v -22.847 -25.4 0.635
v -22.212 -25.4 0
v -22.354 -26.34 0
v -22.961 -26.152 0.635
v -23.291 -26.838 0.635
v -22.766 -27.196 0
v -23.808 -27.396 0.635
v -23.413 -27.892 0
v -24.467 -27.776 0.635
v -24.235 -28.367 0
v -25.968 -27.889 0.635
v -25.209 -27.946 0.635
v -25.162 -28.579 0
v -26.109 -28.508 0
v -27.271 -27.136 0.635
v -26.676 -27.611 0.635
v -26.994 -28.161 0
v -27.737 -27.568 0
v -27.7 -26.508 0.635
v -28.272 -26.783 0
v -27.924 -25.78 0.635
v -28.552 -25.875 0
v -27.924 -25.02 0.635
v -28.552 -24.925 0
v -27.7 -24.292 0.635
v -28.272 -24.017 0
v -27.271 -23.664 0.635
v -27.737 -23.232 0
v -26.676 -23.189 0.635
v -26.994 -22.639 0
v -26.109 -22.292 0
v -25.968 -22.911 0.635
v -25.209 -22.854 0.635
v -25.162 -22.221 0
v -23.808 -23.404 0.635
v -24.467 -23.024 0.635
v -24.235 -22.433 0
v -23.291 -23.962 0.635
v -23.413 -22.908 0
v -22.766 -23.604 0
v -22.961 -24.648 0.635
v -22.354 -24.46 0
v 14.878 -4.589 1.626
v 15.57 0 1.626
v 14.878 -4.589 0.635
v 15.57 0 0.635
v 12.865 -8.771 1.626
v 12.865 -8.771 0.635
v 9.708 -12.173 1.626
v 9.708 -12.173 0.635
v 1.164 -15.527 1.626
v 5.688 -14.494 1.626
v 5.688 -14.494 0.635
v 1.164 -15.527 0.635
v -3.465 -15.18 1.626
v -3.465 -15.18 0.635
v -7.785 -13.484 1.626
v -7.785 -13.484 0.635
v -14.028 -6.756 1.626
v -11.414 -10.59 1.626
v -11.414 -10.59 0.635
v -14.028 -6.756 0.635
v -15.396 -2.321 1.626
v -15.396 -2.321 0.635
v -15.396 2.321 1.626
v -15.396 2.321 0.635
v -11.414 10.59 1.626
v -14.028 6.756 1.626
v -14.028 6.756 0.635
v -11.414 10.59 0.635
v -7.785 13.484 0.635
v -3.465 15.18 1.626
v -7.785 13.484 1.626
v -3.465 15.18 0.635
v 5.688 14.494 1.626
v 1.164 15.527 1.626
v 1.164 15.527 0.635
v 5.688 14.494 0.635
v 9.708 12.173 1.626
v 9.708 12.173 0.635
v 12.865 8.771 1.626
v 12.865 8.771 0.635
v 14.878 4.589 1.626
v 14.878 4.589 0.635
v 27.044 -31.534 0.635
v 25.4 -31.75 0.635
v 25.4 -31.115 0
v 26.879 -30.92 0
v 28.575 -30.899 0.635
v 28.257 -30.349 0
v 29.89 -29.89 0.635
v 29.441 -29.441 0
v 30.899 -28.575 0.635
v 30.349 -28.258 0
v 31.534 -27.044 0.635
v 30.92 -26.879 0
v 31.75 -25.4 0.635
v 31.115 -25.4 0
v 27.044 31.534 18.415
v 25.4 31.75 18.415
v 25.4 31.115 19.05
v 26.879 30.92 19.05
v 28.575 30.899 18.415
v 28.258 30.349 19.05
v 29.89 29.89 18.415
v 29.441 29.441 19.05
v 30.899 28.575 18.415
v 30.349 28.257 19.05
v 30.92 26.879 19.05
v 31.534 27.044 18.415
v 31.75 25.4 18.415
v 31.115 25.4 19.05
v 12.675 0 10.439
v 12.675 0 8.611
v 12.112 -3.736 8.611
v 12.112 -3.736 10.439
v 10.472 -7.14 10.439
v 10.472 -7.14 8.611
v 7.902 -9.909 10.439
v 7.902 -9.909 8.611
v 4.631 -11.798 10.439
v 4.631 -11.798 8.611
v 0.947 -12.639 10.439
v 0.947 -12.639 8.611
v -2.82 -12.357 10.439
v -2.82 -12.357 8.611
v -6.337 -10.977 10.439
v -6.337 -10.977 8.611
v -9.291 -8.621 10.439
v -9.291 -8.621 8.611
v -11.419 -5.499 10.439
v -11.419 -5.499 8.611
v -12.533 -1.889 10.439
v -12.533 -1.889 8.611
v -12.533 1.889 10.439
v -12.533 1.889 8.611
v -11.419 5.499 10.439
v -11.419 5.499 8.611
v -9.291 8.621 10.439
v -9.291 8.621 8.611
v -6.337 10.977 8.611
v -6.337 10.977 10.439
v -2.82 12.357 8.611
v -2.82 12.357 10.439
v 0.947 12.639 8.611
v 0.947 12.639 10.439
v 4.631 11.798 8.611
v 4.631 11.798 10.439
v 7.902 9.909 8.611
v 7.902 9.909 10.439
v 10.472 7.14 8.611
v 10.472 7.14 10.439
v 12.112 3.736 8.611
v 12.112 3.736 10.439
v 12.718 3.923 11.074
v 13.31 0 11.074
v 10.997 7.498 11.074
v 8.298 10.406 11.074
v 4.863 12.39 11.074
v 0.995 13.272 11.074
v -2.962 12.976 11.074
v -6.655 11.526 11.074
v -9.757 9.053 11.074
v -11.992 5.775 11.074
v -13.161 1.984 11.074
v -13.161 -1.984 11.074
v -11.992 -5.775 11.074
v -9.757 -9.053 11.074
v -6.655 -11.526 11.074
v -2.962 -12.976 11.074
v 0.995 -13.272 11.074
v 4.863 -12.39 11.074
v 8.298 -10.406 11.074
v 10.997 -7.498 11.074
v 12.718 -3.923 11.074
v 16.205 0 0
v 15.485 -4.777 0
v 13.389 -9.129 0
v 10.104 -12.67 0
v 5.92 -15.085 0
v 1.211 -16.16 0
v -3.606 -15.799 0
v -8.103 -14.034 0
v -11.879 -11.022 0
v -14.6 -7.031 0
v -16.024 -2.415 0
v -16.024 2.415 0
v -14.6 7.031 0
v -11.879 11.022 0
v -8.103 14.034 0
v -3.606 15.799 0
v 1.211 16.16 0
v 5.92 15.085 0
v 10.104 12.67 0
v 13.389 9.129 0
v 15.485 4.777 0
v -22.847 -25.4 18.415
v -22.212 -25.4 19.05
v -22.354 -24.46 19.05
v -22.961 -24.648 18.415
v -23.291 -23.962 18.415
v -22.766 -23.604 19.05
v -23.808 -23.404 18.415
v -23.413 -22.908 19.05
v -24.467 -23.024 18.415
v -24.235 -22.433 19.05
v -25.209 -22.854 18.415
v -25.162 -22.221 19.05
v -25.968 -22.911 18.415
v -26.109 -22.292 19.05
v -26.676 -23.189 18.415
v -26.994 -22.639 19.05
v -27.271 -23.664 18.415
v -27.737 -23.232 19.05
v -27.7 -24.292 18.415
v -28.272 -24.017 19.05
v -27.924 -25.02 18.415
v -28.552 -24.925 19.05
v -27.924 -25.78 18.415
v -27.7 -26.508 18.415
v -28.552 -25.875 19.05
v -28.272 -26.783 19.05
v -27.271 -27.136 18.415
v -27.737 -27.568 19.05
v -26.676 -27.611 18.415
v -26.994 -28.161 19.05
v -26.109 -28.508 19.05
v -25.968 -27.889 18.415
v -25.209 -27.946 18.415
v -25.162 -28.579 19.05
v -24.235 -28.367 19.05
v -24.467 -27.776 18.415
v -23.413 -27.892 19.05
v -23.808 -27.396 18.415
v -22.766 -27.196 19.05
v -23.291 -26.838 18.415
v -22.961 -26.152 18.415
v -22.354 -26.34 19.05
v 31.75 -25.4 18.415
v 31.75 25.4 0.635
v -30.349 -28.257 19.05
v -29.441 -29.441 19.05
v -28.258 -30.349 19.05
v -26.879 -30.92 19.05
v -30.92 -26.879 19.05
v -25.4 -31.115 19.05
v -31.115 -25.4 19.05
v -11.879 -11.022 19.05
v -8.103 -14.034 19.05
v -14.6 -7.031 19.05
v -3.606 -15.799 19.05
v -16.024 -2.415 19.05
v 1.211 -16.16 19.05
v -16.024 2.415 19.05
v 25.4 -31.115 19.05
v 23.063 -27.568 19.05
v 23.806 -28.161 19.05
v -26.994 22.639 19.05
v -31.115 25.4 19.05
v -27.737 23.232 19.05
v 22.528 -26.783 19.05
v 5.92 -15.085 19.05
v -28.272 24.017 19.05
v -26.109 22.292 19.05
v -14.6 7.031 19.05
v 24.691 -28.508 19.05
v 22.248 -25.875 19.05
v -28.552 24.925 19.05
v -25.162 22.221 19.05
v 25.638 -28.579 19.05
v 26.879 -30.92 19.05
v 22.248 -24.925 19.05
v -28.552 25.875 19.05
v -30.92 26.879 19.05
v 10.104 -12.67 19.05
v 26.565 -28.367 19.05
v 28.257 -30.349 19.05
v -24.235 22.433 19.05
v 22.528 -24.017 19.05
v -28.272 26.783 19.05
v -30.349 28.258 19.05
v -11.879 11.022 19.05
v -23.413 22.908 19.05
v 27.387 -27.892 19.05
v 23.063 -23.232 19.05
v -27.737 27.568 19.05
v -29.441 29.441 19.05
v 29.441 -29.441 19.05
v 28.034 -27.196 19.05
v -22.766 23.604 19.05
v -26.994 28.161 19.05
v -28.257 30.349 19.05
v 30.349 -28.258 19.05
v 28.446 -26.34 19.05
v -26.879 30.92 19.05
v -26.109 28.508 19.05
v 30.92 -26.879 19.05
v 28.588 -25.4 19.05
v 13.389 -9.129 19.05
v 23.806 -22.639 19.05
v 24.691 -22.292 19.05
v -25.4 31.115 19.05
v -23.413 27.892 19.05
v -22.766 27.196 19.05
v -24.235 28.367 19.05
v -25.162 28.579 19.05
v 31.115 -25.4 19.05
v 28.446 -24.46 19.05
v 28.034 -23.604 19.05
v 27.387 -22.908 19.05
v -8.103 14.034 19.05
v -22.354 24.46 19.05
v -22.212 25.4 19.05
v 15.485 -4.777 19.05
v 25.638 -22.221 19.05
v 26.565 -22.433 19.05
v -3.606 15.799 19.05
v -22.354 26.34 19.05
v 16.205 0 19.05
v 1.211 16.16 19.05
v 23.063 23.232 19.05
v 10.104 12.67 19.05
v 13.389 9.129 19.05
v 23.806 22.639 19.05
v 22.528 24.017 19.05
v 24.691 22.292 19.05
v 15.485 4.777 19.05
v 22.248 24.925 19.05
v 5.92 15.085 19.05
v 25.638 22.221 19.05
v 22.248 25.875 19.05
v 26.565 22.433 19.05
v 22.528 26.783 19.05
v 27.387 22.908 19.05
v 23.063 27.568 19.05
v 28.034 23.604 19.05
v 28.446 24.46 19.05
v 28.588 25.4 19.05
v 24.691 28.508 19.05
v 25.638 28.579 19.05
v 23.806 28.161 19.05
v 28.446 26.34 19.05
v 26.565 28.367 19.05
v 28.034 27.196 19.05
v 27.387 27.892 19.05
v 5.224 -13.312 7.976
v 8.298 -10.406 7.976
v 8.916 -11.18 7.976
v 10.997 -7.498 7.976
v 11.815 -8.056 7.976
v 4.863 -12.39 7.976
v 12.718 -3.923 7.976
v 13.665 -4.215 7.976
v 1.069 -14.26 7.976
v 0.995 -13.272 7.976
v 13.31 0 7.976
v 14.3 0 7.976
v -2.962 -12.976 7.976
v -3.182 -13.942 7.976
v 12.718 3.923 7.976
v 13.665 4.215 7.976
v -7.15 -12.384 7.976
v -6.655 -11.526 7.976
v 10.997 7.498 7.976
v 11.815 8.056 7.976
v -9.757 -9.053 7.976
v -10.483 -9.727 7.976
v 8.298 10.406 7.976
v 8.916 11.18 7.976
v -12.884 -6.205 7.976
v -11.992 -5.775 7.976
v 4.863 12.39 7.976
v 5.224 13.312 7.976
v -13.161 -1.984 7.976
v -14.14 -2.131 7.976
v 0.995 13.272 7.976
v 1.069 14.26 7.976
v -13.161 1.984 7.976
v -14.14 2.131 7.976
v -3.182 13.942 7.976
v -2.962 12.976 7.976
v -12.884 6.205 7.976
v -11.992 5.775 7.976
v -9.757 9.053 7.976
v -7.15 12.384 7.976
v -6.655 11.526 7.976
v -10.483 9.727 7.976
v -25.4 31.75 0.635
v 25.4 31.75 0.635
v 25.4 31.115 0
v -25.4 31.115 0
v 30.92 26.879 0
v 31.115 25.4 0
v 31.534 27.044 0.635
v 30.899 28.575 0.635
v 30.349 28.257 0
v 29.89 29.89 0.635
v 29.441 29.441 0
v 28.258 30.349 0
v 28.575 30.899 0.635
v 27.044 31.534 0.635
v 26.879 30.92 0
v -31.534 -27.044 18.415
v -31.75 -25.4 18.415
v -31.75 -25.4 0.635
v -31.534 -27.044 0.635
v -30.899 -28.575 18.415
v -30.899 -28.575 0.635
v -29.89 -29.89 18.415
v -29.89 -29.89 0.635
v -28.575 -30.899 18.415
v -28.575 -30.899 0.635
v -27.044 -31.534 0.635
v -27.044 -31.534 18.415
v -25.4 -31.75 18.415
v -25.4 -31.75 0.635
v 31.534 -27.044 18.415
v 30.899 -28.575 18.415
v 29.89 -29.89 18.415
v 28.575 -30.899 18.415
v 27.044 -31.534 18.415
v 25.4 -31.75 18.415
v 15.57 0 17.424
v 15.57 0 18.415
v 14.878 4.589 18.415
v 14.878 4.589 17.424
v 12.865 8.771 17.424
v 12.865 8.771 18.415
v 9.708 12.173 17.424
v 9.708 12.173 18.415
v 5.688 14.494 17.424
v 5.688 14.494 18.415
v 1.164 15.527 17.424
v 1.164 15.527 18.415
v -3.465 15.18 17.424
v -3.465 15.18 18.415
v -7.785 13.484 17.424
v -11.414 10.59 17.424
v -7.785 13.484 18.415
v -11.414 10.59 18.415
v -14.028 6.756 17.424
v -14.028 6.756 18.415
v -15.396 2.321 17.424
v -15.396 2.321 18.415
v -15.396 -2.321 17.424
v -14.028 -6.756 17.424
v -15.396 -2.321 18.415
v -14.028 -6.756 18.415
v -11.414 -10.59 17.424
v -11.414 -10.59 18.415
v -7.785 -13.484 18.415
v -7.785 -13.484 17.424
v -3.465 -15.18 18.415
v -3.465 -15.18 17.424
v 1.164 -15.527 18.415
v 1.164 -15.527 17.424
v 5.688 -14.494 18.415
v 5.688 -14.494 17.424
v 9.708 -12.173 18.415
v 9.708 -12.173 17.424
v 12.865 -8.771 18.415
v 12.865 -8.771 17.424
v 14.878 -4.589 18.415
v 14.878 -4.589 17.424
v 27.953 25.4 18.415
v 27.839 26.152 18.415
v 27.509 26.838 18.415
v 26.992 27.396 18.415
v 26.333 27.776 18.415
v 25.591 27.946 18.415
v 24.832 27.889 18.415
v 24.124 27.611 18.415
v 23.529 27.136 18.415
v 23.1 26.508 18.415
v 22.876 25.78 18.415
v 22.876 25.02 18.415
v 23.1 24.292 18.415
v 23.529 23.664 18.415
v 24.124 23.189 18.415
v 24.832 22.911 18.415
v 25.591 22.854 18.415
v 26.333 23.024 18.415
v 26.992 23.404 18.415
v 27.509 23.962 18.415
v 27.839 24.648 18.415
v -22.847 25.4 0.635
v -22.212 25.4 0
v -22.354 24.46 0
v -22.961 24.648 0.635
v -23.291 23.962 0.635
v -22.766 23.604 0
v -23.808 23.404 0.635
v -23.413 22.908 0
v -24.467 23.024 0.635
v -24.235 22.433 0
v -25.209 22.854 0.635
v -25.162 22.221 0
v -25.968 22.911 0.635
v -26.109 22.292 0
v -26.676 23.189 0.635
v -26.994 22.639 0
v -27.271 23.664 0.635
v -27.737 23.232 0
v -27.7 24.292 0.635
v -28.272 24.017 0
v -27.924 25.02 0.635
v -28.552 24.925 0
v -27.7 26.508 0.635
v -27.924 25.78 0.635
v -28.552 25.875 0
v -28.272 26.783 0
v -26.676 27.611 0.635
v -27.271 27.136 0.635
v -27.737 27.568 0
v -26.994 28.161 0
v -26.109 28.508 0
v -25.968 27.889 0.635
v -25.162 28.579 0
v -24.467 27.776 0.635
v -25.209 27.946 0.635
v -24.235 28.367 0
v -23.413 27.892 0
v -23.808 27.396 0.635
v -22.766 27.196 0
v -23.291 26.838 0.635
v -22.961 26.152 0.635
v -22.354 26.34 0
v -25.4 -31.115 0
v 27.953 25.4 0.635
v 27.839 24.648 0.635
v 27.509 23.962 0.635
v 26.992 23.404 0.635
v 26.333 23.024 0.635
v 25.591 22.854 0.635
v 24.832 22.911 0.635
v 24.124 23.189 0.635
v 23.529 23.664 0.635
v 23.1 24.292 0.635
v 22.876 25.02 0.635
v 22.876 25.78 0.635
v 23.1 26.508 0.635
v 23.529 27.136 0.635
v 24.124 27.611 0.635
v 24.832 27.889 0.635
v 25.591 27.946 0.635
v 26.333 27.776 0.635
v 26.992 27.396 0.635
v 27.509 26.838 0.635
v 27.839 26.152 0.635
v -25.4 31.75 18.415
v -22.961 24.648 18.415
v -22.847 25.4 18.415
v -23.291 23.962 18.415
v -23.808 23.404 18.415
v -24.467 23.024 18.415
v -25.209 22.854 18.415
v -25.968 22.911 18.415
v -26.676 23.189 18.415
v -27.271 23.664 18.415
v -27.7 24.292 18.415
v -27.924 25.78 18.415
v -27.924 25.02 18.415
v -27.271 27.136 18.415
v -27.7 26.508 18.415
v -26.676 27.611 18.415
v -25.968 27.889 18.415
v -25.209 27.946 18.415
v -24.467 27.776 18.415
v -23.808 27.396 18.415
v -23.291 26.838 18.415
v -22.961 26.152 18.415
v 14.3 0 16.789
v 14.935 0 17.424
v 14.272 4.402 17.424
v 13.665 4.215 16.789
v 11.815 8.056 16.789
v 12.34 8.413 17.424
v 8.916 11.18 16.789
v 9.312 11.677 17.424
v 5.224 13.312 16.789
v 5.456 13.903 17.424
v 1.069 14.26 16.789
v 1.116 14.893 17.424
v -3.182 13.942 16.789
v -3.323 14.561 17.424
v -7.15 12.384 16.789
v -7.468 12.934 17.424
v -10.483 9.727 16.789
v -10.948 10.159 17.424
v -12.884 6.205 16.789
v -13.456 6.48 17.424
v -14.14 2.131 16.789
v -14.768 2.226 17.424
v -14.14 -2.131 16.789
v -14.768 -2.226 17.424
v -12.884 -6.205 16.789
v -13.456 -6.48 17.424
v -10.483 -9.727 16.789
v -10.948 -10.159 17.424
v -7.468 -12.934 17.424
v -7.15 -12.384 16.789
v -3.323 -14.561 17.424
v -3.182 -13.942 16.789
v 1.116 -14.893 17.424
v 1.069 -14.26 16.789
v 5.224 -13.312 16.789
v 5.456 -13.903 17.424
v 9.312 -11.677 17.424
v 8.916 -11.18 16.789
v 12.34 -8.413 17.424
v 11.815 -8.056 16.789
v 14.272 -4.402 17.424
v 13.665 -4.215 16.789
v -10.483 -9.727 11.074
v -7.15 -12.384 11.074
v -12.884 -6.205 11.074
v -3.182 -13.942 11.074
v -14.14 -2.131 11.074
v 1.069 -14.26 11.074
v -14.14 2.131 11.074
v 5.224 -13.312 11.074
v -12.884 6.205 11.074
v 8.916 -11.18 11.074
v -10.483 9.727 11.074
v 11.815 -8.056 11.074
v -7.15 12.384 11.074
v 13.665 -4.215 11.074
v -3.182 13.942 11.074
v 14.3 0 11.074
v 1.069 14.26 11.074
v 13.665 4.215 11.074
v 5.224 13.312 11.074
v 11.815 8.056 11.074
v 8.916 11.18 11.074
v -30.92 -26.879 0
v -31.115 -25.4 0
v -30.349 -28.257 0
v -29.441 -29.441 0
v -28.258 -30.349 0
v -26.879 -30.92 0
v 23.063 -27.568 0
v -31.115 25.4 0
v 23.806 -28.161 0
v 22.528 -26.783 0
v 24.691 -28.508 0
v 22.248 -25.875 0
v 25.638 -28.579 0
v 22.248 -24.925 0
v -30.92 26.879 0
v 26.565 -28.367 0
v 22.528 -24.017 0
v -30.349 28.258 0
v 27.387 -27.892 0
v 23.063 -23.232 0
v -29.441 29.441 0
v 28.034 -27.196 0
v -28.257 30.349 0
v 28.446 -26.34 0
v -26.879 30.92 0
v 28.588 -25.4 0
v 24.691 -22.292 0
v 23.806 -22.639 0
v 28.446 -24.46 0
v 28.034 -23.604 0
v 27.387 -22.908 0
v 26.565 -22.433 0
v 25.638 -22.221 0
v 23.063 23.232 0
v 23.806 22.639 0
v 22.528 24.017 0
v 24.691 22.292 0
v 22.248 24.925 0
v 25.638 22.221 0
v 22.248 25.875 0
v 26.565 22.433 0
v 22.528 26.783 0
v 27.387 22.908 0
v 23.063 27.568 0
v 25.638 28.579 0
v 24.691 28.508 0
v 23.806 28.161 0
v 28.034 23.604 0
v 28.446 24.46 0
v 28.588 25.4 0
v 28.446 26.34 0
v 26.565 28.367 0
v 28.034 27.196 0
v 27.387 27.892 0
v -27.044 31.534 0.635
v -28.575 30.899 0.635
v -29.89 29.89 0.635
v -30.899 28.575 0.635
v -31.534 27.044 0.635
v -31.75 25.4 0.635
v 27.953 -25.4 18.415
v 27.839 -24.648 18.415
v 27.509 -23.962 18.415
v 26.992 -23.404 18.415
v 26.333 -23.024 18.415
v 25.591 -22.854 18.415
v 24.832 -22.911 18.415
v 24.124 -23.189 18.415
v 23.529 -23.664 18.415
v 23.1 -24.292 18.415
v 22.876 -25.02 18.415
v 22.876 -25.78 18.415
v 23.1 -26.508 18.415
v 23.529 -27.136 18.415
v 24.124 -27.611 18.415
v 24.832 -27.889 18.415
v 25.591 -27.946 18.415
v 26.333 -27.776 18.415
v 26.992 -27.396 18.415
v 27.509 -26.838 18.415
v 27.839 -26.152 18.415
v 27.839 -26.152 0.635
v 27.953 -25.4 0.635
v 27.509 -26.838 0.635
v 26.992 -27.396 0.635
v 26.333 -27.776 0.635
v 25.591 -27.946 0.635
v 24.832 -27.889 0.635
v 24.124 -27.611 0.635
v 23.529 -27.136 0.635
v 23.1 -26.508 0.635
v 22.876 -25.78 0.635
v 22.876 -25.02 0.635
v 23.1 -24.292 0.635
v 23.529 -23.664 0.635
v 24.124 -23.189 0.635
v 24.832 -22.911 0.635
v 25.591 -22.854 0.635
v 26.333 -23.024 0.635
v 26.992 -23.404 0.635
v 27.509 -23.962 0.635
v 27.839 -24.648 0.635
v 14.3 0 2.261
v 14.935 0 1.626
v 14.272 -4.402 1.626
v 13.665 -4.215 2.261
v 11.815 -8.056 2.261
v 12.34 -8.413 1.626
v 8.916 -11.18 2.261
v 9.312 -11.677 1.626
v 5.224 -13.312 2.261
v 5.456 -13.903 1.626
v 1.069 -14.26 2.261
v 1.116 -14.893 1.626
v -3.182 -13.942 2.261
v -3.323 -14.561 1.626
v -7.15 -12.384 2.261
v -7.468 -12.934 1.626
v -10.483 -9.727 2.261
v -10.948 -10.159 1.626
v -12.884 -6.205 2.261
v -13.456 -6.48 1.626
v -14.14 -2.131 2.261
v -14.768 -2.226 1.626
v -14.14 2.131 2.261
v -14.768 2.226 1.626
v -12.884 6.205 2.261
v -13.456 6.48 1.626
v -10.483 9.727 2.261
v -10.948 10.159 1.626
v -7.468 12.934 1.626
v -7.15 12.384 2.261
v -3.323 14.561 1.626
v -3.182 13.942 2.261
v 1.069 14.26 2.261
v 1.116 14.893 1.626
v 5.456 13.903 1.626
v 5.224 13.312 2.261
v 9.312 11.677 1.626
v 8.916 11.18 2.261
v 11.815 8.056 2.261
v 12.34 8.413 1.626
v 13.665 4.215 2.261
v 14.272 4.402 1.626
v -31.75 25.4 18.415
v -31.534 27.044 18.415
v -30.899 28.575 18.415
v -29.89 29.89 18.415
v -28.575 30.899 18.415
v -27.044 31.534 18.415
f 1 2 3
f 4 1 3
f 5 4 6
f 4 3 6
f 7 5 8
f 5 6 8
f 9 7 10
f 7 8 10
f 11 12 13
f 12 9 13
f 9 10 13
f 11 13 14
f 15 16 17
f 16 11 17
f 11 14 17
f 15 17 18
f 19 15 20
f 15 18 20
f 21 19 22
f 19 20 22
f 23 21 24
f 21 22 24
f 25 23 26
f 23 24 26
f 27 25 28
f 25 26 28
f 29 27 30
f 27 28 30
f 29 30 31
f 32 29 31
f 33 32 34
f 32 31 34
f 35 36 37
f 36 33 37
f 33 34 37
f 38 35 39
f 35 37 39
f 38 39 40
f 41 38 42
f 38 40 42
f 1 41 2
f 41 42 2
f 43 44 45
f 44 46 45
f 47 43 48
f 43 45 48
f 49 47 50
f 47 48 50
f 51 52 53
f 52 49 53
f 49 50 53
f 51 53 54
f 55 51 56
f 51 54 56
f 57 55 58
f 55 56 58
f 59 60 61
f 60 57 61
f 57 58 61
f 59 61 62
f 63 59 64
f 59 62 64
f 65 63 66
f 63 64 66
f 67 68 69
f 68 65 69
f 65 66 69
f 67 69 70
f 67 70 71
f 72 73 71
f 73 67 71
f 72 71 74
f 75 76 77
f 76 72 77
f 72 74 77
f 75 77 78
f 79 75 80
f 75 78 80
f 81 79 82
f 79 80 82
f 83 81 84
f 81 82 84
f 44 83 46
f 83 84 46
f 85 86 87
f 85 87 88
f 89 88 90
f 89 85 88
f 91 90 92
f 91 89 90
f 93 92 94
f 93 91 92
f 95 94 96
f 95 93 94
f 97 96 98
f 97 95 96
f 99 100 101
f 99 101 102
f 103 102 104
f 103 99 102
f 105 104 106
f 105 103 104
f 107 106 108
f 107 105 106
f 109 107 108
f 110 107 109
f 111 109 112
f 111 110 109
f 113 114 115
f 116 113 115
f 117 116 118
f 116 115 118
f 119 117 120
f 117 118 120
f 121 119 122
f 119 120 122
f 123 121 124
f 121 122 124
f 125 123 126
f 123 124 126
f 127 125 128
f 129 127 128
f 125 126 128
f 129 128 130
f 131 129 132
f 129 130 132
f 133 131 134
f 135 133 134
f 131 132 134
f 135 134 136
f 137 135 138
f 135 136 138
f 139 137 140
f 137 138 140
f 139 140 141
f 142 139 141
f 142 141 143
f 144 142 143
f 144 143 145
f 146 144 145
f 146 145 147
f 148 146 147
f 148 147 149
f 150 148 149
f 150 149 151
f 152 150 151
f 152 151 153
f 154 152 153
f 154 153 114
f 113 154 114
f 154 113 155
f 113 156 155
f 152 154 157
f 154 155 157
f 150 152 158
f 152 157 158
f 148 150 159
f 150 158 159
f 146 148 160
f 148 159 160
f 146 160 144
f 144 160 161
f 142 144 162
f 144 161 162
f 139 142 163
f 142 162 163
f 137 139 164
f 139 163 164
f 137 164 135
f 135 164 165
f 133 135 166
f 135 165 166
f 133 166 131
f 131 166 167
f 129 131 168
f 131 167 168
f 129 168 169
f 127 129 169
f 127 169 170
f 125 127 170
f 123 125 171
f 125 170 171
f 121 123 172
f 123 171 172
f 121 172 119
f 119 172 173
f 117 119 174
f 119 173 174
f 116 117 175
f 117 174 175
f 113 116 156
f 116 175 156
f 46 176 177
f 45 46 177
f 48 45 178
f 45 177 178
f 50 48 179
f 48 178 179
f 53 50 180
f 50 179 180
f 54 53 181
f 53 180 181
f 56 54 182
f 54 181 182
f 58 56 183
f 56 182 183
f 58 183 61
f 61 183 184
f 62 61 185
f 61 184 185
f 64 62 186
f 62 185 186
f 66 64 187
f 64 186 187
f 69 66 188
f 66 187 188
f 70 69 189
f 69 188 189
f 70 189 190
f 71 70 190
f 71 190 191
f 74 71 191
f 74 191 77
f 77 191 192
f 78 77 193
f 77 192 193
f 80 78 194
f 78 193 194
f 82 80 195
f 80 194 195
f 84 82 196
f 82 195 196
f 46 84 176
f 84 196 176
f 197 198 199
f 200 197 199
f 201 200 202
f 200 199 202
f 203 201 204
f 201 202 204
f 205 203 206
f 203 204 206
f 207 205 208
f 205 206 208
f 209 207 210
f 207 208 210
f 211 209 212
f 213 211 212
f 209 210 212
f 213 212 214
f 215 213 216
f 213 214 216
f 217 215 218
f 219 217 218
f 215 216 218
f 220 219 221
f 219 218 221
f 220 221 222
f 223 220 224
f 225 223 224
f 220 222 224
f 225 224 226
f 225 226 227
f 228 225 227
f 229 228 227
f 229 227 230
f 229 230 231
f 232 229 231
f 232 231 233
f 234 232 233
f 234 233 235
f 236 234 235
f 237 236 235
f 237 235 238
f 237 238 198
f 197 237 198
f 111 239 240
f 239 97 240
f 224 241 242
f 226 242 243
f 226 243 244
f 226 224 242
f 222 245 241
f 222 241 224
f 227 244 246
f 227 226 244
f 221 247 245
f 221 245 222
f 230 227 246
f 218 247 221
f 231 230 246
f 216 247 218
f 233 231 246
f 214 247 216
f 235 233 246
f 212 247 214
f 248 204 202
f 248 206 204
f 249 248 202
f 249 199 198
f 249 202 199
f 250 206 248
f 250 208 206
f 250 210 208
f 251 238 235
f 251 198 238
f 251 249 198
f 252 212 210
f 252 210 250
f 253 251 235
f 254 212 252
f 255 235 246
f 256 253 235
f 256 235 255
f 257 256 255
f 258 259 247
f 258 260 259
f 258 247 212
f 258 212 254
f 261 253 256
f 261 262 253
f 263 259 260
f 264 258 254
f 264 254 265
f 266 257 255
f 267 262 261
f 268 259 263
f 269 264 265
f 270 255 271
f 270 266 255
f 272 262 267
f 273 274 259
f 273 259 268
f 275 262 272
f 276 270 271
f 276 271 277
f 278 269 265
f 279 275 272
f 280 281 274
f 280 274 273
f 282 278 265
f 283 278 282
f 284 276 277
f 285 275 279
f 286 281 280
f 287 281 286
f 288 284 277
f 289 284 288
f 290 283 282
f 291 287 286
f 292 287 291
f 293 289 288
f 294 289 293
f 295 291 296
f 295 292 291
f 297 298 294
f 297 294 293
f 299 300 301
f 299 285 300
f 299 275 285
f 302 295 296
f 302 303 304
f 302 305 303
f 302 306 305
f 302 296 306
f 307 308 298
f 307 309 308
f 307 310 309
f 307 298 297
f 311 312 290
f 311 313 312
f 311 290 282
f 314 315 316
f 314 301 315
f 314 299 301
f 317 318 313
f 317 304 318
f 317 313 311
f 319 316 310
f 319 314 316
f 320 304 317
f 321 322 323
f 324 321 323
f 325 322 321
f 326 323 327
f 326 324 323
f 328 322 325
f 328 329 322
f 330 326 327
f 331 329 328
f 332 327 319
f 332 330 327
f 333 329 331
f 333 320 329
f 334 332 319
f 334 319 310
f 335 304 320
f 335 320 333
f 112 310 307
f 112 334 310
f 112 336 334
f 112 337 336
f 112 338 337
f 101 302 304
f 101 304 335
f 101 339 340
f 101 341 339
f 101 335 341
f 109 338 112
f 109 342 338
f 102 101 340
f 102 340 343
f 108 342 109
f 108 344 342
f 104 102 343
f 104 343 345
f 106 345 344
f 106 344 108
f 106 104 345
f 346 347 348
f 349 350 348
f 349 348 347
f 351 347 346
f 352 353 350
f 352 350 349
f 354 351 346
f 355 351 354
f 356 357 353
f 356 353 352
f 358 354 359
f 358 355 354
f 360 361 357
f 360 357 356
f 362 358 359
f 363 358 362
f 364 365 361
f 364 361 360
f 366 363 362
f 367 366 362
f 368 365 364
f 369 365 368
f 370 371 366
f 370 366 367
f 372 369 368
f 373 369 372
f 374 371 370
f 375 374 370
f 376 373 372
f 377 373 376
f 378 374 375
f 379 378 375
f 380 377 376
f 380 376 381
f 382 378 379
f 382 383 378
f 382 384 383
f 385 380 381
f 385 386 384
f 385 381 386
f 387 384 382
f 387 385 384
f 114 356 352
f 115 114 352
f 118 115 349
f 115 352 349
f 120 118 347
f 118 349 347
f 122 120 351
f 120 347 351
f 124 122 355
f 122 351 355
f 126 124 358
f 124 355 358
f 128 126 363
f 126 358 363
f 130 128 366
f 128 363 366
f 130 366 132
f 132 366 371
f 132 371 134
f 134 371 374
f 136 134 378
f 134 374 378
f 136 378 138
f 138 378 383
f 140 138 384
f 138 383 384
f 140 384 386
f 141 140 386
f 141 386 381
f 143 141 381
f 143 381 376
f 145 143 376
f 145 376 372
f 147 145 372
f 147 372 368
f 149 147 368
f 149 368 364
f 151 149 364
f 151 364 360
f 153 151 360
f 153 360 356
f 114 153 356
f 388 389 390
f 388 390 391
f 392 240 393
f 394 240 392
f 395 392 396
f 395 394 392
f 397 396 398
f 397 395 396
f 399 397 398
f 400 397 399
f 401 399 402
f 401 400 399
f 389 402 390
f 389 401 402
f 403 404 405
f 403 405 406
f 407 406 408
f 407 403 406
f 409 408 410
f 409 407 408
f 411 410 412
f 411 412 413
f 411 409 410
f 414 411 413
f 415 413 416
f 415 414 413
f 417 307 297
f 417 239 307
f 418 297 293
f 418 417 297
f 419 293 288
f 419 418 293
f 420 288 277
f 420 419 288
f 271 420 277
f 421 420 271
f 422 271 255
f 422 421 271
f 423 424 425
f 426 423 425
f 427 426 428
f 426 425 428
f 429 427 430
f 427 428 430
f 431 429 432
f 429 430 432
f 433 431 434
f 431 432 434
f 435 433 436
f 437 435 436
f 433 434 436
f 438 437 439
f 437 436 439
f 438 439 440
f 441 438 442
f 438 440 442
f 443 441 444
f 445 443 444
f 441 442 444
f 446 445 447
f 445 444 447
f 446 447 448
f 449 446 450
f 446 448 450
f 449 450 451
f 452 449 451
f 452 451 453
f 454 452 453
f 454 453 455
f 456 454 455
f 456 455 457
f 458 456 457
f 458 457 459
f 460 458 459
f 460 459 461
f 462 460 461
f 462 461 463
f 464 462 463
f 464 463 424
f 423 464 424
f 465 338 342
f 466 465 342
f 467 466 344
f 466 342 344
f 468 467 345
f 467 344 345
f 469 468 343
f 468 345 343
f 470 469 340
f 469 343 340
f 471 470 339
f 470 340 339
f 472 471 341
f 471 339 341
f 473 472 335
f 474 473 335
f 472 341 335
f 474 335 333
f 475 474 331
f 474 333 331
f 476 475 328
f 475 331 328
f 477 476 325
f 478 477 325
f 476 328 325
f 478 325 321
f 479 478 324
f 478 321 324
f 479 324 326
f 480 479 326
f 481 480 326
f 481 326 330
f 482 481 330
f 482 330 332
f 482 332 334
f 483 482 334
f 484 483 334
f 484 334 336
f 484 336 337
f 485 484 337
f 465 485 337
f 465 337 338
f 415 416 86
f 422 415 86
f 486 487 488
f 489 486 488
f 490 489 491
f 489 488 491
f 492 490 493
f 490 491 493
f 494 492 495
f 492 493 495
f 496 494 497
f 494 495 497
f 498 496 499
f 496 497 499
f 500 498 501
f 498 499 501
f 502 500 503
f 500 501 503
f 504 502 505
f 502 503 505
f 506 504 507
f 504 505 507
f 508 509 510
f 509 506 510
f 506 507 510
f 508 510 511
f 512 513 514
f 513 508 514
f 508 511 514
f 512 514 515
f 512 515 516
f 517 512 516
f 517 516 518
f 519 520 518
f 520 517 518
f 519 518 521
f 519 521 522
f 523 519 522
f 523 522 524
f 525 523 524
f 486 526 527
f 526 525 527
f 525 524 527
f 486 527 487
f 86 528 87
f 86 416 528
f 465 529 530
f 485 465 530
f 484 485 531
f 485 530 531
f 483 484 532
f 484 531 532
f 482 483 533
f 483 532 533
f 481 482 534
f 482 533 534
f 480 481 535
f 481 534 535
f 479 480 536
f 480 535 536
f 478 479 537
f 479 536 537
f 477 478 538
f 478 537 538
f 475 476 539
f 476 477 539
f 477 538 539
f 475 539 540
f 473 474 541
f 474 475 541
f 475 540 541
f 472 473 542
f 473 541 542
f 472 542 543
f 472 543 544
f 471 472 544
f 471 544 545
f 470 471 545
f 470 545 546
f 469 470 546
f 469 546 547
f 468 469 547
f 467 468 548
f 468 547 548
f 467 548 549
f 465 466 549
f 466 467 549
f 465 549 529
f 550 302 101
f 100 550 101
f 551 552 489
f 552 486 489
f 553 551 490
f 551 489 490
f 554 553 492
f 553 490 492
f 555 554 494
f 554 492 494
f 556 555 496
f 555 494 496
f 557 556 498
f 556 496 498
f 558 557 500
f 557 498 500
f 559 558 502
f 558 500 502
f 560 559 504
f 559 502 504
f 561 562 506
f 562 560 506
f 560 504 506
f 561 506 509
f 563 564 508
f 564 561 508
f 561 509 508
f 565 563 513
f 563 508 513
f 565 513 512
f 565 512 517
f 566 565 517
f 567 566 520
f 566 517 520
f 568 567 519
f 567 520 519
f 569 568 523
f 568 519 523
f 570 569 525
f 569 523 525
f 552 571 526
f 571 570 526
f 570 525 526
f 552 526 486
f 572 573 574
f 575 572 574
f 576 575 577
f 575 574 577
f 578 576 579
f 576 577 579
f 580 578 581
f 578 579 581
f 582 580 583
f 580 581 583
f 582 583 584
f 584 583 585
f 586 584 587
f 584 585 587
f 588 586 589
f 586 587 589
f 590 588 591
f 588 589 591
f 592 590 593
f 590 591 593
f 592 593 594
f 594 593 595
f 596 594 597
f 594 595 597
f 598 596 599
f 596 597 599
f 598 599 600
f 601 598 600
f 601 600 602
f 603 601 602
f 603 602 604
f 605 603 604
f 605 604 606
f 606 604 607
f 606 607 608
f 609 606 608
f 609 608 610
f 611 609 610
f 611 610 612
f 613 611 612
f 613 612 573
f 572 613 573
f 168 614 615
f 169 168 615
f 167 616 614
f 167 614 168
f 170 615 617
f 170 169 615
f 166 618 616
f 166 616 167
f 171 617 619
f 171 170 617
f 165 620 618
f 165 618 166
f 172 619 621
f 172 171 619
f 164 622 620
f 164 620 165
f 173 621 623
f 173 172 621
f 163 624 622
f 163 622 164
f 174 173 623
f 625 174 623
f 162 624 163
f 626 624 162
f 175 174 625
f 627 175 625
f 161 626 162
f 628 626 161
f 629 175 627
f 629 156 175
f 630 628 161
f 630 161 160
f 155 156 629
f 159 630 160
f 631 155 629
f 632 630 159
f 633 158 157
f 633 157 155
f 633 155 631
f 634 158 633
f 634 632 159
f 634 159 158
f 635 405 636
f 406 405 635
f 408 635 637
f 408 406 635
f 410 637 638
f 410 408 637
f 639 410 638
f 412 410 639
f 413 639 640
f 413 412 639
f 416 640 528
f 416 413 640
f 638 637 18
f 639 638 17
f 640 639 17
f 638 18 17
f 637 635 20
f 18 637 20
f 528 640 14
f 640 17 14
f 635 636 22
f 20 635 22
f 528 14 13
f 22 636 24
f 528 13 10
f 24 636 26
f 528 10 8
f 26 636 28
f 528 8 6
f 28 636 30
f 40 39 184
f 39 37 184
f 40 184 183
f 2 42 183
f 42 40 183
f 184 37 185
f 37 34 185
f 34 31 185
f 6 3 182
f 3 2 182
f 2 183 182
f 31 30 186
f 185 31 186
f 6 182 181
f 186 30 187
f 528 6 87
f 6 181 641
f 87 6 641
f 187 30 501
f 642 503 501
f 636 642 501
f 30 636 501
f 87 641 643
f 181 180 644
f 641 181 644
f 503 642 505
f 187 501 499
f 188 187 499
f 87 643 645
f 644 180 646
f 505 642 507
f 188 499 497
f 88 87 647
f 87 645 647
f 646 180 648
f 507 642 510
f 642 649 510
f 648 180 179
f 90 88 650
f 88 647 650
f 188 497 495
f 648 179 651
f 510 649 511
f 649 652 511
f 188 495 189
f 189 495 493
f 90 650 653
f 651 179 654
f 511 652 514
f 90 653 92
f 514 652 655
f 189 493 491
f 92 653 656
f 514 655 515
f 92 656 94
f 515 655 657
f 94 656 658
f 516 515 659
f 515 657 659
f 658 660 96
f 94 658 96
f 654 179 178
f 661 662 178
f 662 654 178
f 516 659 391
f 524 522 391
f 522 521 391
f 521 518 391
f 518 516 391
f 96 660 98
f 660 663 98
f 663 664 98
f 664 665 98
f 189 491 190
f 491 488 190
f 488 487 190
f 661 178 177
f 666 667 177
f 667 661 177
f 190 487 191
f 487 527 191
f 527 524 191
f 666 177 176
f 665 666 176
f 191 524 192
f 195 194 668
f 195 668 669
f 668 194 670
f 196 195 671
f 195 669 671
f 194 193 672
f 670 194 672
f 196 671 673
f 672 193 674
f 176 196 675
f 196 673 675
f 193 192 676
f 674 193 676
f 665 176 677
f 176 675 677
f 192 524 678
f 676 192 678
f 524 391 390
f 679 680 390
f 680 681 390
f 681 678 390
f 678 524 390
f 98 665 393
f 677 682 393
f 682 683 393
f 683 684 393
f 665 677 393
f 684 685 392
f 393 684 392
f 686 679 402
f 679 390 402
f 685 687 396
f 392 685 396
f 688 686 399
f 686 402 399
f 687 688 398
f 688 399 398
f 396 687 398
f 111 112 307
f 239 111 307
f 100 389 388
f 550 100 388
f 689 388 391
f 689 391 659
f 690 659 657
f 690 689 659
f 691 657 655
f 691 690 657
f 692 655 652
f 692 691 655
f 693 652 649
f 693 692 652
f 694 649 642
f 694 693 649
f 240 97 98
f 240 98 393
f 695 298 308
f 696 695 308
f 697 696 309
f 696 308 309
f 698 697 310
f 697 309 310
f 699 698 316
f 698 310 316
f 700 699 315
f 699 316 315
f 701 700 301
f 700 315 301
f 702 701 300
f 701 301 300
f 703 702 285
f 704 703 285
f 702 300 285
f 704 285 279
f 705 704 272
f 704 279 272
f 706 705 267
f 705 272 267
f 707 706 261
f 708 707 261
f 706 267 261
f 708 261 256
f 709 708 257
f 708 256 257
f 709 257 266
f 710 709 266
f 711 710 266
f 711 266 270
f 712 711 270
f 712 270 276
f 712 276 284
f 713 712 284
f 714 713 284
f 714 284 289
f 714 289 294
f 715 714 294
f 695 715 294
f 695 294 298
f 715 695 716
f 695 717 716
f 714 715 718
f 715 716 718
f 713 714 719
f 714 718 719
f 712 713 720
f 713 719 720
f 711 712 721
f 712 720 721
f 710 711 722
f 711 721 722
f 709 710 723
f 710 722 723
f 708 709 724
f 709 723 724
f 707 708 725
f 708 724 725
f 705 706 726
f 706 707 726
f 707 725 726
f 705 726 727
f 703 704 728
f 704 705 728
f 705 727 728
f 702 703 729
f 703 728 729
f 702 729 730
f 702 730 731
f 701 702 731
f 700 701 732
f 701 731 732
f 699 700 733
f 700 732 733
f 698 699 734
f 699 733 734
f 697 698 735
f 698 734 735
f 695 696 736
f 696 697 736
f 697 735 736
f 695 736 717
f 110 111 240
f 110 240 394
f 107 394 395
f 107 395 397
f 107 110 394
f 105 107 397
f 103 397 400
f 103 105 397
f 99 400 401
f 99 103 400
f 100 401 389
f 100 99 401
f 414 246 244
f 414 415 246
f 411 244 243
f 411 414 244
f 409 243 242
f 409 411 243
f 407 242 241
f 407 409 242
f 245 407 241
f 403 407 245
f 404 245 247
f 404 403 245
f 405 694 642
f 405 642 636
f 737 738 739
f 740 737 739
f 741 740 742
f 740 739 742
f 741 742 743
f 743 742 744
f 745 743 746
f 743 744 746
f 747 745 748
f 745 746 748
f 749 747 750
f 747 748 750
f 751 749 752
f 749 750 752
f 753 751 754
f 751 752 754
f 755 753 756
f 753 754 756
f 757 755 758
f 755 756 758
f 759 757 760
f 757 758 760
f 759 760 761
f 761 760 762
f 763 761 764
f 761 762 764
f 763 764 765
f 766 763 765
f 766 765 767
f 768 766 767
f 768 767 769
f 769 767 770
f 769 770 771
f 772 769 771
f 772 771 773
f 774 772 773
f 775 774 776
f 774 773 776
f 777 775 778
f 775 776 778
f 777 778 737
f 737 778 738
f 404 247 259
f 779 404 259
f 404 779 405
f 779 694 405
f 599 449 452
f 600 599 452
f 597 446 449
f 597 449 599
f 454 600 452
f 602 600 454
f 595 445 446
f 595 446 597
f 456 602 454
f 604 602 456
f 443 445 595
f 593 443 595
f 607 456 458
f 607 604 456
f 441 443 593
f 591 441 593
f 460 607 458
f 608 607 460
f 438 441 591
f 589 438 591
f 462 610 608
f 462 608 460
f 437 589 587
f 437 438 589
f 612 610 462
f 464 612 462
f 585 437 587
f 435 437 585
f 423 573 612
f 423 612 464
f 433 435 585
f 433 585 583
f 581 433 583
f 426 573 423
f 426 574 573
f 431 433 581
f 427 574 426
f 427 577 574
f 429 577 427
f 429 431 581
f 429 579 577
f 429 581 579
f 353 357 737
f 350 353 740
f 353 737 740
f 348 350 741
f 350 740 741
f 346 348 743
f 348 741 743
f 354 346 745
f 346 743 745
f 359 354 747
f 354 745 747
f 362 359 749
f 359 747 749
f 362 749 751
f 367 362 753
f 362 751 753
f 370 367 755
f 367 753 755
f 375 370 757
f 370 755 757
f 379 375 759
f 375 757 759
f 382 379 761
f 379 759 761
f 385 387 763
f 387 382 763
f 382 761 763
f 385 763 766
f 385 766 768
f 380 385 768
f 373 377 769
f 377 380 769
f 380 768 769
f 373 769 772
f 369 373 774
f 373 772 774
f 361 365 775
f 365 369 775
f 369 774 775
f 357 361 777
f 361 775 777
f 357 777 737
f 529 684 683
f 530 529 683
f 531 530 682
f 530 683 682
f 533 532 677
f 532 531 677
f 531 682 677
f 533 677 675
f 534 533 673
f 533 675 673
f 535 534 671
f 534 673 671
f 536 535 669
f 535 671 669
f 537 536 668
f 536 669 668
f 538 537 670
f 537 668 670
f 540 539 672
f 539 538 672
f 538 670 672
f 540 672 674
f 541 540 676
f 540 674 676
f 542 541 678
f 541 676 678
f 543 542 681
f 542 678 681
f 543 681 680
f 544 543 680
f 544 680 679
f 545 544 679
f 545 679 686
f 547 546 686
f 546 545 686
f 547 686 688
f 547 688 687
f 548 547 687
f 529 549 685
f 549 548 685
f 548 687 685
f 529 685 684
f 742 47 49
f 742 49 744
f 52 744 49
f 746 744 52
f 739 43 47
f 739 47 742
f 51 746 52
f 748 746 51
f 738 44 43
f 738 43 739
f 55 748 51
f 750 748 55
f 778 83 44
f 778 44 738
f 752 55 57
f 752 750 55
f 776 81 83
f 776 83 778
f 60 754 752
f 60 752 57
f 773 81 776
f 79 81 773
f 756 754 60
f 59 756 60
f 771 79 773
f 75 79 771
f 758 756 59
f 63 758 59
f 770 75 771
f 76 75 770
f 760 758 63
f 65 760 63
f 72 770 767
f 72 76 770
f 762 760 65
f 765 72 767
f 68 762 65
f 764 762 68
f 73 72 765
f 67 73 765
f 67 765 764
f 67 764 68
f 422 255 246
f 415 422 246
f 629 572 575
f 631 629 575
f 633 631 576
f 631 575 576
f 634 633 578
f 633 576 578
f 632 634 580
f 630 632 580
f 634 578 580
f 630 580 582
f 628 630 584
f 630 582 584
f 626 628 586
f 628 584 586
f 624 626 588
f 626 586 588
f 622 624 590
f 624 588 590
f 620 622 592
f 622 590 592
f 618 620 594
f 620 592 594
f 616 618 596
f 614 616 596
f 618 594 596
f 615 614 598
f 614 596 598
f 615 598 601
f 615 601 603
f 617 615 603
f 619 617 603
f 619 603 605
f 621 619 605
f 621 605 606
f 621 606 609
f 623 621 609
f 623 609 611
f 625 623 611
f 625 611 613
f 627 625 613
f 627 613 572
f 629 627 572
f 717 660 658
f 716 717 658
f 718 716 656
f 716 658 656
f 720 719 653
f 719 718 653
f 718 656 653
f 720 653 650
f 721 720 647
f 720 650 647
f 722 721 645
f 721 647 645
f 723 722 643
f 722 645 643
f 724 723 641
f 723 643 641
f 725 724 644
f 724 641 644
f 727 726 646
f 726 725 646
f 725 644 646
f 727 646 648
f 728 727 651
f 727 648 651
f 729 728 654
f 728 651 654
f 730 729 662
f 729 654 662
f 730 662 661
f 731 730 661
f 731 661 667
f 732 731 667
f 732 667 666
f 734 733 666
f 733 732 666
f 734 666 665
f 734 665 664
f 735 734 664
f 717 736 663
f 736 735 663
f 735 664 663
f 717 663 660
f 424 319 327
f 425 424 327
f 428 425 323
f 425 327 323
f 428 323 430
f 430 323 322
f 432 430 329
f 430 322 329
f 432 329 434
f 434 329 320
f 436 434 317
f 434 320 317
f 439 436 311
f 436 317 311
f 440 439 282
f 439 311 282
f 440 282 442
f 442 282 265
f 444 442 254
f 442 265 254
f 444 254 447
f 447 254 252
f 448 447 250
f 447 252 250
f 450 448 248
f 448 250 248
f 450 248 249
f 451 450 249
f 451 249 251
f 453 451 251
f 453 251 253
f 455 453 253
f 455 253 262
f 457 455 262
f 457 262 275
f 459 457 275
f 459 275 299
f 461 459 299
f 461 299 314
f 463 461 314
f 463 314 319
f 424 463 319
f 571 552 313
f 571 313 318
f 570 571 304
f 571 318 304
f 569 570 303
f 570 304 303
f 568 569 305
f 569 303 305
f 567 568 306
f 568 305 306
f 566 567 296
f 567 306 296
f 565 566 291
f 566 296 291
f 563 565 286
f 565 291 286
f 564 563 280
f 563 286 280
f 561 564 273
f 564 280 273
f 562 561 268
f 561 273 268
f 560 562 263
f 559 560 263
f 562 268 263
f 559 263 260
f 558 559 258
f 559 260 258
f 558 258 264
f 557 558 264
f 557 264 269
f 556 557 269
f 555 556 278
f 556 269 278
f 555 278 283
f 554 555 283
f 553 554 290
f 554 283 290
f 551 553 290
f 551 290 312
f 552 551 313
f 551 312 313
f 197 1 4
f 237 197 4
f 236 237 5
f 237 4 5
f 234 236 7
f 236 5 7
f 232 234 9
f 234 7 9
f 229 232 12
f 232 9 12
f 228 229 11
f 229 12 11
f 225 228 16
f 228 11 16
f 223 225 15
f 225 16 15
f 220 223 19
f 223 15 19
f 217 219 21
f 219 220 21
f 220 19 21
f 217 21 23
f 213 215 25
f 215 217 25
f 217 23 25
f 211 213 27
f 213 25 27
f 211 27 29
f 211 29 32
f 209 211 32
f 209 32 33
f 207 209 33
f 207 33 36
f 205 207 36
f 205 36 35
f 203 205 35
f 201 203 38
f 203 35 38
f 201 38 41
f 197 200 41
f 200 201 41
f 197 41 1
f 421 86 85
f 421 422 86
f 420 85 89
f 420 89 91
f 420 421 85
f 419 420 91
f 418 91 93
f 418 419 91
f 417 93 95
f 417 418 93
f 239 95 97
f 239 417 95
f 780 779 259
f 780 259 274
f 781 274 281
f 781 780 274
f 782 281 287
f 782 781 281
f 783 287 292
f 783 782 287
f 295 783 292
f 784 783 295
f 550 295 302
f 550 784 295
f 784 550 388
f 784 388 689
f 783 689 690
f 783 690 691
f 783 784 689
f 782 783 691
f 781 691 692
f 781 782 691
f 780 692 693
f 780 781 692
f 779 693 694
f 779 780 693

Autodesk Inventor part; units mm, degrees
ref_plane "YZ Plane" through (0, 0, 0) normal (1, 0, 0) x (0, 1, 0)
ref_plane "XZ Plane" through (0, 0, 0) normal (0, 1, 0) x (-1, 0, 0)
sketch "Sketch1" plane through (0, 0, 0) normal (0, 0, 1) x (1, 0, 0)
  line L0 (-31.75, -31.75) -> (31.75, -31.75)
  line L1 (31.75, -31.75) -> (31.75, 31.75)
  line L2 (31.75, 31.75) -> (-31.75, 31.75)
  line L3 (-31.75, 31.75) -> (-31.75, -31.75)
  line L4 (-31.75, -31.75) -> (31.75, 31.75) construction
  line L5 (31.75, -31.75) -> (-31.75, 31.75) construction
  circle A0 centre (-25.4, 25.4) radius 2.5527
  circle A1 centre (25.4, 25.4) radius 2.5527
  circle A2 centre (-25.4, -25.4) radius 2.5527
  circle A3 centre (25.4, -25.4) radius 2.5527
  circle A4 centre (0, 0) radius 12.6746
  dimension "d0" = 63.5
  dimension "d1" = 63.5
  dimension "d2" = 6.35
  dimension "d5" = 50.8
  dimension "d8" = 50.8
  dimension "d11" = 5.1054
  dimension "d12" = 25.3492
extrude "Extrusion1" add sketch "Sketch1" along normal blind 19.05
fillet "Fillet1" radius 6.35 4 edges at (31.75, 31.75, 9.525) (31.75, -31.75, 9.525) (-31.75, -31.75, 9.525) (-31.75, 31.75, 9.525)
sketch "Sketch2" plane through (0, 0, 19.05) normal (0, 0, 1) x (1, 0, 0)
  circle A0 centre (0, 0) radius 14.3002
  dimension "d16" = 28.6004
extrude "Extrusion2" cut sketch "Sketch2" against normal blind 7.9756
sketch "Sketch3" plane through (0, 0, 19.05) normal (0, 0, 1) x (1, 0, 0)
  circle A0 centre (0, 0) radius 15.5702
  dimension "d19" = 31.1404
extrude "Extrusion3" cut sketch "Sketch3" against normal blind 1.6256
ref_plane "Work Plane1" through (0, 0, 9.525) normal (0, 0, 1) x (1, 0, 0)
mirror "Mirror1" about plane through (0, 0, 9.525) normal (0, 0, 1) of "Extrusion2", "Extrusion3"
chamfer "Chamfer1" distance 0.635 angle 45 16 edges at (-31.75, 0, 19.05) (-29.8901, -29.8901, 19.05) (0, -31.75, 19.05) (29.8901, -29.8901, 19.05) (31.75, 0, 19.05) (29.8901, 29.8901, 19.05) (0, 31.75, 19.05) (-29.8901, 29.8901, 19.05) (0, -31.75, 0) (29.8901, -29.8901, 0) (31.75, 0, 0) (29.8901, 29.8901, 0) (0, 31.75, 0) (-29.8901, 29.8901, 0) (-31.75, 0, 0) (-29.8901, -29.8901, 0)
chamfer "Chamfer2" distance 0.635 angle 45 6 edges at (-15.5702, 0, 19.05) (-14.3002, 0, 17.4244) (-12.6746, 0, 11.0744) (-12.6746, 0, 7.9756) (-14.3002, 0, 1.6256) (-15.5702, 0, 0)
chamfer "Chamfer3" distance 0.635 angle 45 8 edges at (-27.9527, -25.4, 19.05) (22.8473, -25.4, 19.05) (22.8473, 25.4, 19.05) (-27.9527, 25.4, 19.05) (22.8473, 25.4, 0) (22.8473, -25.4, 0) (-27.9527, -25.4, 0) (-27.9527, 25.4, 0)
properties part number "BearingBlockForPrototypePlate2"
